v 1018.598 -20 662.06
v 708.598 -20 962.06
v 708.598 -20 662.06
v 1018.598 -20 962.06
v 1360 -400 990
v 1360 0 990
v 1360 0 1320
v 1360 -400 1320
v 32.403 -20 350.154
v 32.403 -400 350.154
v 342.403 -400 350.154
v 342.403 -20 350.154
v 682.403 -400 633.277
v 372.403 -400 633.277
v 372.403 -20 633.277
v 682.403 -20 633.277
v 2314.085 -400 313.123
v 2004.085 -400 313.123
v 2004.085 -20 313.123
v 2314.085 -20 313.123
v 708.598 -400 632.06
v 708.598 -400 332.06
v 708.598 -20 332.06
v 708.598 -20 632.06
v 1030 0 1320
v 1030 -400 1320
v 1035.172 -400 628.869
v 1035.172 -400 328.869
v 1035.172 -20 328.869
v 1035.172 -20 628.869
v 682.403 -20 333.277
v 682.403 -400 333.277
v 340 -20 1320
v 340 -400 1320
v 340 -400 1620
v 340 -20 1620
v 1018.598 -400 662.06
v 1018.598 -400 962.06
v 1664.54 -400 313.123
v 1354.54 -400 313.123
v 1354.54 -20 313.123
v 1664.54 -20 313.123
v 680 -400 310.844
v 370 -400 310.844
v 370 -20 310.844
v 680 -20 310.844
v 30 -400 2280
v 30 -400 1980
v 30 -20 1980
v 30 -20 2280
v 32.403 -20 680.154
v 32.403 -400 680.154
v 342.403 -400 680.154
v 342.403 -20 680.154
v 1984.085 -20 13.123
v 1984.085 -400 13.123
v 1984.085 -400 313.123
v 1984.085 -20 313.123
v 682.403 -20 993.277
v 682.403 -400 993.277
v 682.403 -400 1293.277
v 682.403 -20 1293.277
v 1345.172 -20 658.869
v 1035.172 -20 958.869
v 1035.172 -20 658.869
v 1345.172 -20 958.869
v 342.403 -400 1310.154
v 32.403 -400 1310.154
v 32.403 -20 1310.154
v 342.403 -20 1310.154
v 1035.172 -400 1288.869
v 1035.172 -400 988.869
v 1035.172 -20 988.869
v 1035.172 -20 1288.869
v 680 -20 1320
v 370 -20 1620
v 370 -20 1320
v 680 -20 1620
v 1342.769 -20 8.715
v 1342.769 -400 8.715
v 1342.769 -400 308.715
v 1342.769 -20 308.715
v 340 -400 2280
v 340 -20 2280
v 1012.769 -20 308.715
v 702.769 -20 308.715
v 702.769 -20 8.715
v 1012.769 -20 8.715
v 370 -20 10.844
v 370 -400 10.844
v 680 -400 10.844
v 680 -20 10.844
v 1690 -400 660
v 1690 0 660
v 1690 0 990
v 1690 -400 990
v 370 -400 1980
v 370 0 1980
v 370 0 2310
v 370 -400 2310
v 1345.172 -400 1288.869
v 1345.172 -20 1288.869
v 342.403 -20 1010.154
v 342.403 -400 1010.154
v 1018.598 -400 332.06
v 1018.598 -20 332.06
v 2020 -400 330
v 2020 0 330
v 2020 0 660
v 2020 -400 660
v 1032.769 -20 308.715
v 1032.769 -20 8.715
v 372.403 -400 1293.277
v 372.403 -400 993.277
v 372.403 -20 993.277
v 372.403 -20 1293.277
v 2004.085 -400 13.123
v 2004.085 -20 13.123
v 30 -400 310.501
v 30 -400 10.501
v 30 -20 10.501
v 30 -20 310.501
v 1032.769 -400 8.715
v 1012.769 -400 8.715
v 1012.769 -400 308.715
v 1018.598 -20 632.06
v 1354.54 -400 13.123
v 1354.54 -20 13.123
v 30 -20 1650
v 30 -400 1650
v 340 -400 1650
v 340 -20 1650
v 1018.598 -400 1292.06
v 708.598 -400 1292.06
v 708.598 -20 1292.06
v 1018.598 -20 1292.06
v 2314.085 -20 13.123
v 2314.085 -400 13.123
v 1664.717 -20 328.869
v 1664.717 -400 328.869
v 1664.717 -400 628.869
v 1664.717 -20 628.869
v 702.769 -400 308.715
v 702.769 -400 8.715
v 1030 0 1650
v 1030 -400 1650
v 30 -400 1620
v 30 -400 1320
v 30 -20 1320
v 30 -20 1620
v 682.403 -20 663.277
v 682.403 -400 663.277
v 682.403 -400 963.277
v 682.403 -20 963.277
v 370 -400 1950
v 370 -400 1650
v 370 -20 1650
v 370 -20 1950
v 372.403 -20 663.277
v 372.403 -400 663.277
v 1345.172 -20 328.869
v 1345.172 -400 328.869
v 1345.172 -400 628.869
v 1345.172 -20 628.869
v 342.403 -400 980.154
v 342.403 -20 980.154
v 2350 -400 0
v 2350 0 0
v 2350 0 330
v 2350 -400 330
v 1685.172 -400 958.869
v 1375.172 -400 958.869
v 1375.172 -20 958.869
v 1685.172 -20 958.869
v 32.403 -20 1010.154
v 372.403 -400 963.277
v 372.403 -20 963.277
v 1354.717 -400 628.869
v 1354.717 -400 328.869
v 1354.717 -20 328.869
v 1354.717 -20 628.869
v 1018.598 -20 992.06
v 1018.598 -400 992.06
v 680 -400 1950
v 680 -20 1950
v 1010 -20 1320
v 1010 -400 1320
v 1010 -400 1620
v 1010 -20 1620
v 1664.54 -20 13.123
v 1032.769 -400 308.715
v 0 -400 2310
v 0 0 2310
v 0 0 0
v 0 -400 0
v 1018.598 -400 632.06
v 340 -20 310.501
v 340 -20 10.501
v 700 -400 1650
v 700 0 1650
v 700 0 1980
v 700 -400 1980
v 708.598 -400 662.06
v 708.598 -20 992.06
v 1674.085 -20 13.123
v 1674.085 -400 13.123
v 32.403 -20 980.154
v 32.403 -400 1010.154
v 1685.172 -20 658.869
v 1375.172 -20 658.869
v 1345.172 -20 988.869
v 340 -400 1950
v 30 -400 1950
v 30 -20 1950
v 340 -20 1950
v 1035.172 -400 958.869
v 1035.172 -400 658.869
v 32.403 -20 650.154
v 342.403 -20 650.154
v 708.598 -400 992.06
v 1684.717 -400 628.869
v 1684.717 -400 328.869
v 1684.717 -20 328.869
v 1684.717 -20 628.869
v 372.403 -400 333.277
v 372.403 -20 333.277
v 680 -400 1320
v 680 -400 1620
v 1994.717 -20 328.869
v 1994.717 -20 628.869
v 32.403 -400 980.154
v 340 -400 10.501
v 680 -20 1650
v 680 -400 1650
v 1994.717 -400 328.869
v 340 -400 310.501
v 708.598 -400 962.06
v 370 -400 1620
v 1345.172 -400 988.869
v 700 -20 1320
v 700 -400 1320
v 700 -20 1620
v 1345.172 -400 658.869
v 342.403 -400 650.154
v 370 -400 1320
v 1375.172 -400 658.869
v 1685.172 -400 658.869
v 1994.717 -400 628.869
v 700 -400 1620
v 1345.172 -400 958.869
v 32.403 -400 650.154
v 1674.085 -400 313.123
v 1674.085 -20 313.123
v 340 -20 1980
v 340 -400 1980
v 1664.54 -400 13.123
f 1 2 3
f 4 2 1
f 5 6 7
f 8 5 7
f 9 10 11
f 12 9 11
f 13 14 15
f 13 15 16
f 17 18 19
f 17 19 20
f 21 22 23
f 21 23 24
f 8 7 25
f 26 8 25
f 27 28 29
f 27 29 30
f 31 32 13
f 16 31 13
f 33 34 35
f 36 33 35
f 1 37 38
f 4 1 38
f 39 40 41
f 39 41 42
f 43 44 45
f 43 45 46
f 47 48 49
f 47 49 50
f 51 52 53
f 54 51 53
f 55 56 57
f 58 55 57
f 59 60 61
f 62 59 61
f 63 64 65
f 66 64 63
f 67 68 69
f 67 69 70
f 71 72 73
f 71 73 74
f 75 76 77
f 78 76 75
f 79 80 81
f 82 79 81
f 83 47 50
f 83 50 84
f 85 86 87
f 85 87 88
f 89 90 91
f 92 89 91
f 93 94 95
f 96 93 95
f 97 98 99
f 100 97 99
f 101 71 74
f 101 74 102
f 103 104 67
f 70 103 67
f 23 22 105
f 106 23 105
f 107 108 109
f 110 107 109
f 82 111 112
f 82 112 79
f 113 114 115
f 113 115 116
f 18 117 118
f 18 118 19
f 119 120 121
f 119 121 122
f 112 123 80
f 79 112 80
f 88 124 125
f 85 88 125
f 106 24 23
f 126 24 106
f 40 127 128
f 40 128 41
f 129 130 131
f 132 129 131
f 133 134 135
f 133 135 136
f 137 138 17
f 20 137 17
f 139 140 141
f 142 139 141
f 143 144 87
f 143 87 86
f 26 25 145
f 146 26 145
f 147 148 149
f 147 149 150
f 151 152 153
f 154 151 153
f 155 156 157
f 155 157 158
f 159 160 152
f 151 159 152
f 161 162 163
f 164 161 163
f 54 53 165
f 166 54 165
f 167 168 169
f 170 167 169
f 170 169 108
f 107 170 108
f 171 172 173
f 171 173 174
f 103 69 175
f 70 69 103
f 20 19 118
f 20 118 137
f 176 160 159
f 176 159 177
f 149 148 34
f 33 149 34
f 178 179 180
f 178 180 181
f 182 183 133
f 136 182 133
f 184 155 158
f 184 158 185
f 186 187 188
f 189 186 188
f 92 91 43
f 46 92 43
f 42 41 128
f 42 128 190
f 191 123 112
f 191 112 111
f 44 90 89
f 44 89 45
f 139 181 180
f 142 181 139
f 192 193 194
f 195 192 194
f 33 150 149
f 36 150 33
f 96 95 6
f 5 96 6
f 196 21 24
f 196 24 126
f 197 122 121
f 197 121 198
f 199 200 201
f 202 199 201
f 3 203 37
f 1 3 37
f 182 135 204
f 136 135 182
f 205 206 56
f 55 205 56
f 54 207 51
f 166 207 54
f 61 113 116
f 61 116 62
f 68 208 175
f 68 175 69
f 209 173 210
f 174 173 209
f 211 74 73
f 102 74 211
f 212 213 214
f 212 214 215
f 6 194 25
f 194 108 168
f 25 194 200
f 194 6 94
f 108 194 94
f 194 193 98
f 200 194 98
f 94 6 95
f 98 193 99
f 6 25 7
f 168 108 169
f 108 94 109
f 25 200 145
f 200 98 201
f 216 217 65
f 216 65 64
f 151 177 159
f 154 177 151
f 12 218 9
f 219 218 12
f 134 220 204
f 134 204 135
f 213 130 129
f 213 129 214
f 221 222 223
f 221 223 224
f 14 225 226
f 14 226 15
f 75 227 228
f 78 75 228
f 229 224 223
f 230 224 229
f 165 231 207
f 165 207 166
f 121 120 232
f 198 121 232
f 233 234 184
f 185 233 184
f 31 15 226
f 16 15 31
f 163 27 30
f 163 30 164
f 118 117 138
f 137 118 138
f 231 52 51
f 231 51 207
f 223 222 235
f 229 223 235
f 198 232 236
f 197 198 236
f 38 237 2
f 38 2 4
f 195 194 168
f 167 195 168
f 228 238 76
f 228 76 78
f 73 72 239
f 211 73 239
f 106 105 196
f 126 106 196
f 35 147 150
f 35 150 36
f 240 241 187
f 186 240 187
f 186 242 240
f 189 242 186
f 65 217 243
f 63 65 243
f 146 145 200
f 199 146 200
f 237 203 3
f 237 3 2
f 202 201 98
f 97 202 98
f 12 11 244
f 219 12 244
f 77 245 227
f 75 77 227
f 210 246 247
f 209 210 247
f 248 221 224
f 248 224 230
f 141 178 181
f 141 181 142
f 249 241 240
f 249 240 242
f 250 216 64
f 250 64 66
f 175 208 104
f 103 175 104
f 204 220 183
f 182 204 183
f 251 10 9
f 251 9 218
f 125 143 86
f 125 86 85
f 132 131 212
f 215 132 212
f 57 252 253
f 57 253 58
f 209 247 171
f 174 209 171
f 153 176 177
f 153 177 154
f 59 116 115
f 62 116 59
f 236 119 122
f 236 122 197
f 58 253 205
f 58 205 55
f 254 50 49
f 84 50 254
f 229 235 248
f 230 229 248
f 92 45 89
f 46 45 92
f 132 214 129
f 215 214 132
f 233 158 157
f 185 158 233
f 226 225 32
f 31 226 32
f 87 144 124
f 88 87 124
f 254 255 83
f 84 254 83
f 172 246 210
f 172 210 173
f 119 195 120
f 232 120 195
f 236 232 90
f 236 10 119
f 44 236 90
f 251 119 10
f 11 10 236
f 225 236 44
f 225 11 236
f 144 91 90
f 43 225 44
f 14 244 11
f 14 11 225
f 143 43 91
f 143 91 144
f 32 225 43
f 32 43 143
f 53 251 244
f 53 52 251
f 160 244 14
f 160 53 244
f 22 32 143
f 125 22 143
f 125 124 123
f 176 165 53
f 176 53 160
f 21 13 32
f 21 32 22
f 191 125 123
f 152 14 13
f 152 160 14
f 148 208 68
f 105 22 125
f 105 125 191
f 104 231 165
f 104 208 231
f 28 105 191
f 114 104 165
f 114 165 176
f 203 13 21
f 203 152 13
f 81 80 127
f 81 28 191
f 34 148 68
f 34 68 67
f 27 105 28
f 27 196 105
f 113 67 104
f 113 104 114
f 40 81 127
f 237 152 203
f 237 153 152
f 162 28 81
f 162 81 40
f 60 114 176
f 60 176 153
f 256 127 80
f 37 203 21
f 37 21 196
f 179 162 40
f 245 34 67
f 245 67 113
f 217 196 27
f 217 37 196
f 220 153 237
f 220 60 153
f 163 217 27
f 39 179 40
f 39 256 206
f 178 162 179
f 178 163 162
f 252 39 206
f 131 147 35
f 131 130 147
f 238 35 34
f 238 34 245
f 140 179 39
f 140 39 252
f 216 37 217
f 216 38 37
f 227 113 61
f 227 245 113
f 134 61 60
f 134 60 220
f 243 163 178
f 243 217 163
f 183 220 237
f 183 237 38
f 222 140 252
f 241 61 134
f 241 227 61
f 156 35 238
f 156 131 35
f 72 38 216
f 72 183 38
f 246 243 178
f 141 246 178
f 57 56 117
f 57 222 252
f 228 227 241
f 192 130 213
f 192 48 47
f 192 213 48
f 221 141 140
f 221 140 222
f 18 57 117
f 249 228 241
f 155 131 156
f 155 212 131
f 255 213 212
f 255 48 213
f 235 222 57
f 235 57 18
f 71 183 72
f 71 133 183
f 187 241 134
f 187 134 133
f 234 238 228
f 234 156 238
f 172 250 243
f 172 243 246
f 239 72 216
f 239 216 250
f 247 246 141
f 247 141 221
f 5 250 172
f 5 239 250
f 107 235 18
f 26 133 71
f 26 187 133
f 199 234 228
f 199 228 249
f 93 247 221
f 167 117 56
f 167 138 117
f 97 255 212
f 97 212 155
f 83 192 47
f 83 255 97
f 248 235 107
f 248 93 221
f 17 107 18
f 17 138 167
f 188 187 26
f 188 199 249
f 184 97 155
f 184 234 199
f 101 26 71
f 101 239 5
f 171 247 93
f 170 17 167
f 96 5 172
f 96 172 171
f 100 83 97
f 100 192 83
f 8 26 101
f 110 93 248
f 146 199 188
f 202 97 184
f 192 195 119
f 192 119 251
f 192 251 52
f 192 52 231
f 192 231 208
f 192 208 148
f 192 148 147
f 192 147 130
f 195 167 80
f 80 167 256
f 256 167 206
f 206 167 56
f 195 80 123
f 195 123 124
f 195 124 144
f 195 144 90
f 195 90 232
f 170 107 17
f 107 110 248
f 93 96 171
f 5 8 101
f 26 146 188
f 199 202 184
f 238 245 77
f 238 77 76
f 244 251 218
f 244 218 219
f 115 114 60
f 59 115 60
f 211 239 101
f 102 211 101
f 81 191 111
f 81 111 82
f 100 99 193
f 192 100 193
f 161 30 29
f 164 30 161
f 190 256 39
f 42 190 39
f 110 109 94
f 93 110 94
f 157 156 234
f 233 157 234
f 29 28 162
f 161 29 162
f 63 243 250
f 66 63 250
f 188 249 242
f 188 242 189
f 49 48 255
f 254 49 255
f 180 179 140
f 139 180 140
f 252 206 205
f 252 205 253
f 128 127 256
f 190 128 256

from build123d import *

# Parameters (mm, degrees)
F1_DEPTH = 400
F2_W     = 310
F2_H     = 300
F3_DEPTH = 380


with BuildPart() as f1:
    # F0 (on Front) → F1 (new body)
    with BuildSketch(Plane.XZ):
        Polygon((0, 2310), (0, 0), (2350, 0), (2350, 330), (2020, 330), (2020, 660), (1690, 660), (1690, 990), (1360, 990), (1360, 1320), (1030, 1320), (1030, 1650), (700, 1650), (700, 1980), (370, 1980), (370, 2310), align=None)
    extrude(amount=F1_DEPTH)

    # F2 (on face) → F3 (cut)
    with BuildSketch(Plane.XZ.offset(400)):
        with Locations((185, 2130)):
            Rectangle(F2_W, F2_H)
        with Locations((185, 1800)):
            Rectangle(F2_W, F2_H)
        with Locations((525, 1800)):
            Rectangle(F2_W, F2_H)
        with Locations((185, 1470)):
            Rectangle(F2_W, F2_H)
        with Locations((525, 1470)):
            Rectangle(F2_W, F2_H)
        with Locations((855, 1470)):
            Rectangle(F2_W, F2_H)
        with Locations((1190.171862, 1138.869377)):
            Rectangle(F2_W, F2_H)
        with Locations((1190.171862, 808.869377)):
            Rectangle(F2_W, F2_H)
        with Locations((1530.171862, 808.869377)):
            Rectangle(F2_W, F2_H)
        with Locations((1190.171862, 478.869377)):
            Rectangle(F2_W, F2_H)
        with Locations((1509.71662, 478.869377)):
            Rectangle(F2_W, F2_H)
        with Locations((1839.71662, 478.869377)):
            Rectangle(F2_W, F2_H)
        with Locations((1509.539871, 163.122852)):
            Rectangle(F2_W, F2_H)
        with Locations((1829.08463, 163.122852)):
            Rectangle(F2_W, F2_H)
        with Locations((2159.08463, 163.122852)):
            Rectangle(F2_W, F2_H)
        with Locations((525, 160.843834)):
            Rectangle(F2_W, F2_H)
        with Locations((857.768586, 158.714935)):
            Rectangle(F2_W, F2_H)
        with Locations((1187.768586, 158.714935)):
            Rectangle(F2_W, F2_H)
        with Locations((185, 160.501046)):
            Rectangle(F2_W, F2_H)
        with Locations((187.403275, 1160.154443)):
            Rectangle(F2_W, F2_H)
        with Locations((187.403275, 830.154443)):
            Rectangle(F2_W, F2_H)
        with Locations((187.403275, 500.154443)):
            Rectangle(F2_W, F2_H)
        with Locations((527.403276, 1143.277281)):
            Rectangle(F2_W, F2_H)
        with Locations((527.403276, 813.277281)):
            Rectangle(F2_W, F2_H)
        with Locations((527.403276, 483.277281)):
            Rectangle(F2_W, F2_H)
        with Locations((863.598442, 1142.060464)):
            Rectangle(F2_W, F2_H)
        with Locations((863.598442, 812.060464)):
            Rectangle(F2_W, F2_H)
        with Locations((863.598442, 482.060464)):
            Rectangle(F2_W, F2_H)
    extrude(amount=-F3_DEPTH, mode=Mode.SUBTRACT)


solid = f1.part
